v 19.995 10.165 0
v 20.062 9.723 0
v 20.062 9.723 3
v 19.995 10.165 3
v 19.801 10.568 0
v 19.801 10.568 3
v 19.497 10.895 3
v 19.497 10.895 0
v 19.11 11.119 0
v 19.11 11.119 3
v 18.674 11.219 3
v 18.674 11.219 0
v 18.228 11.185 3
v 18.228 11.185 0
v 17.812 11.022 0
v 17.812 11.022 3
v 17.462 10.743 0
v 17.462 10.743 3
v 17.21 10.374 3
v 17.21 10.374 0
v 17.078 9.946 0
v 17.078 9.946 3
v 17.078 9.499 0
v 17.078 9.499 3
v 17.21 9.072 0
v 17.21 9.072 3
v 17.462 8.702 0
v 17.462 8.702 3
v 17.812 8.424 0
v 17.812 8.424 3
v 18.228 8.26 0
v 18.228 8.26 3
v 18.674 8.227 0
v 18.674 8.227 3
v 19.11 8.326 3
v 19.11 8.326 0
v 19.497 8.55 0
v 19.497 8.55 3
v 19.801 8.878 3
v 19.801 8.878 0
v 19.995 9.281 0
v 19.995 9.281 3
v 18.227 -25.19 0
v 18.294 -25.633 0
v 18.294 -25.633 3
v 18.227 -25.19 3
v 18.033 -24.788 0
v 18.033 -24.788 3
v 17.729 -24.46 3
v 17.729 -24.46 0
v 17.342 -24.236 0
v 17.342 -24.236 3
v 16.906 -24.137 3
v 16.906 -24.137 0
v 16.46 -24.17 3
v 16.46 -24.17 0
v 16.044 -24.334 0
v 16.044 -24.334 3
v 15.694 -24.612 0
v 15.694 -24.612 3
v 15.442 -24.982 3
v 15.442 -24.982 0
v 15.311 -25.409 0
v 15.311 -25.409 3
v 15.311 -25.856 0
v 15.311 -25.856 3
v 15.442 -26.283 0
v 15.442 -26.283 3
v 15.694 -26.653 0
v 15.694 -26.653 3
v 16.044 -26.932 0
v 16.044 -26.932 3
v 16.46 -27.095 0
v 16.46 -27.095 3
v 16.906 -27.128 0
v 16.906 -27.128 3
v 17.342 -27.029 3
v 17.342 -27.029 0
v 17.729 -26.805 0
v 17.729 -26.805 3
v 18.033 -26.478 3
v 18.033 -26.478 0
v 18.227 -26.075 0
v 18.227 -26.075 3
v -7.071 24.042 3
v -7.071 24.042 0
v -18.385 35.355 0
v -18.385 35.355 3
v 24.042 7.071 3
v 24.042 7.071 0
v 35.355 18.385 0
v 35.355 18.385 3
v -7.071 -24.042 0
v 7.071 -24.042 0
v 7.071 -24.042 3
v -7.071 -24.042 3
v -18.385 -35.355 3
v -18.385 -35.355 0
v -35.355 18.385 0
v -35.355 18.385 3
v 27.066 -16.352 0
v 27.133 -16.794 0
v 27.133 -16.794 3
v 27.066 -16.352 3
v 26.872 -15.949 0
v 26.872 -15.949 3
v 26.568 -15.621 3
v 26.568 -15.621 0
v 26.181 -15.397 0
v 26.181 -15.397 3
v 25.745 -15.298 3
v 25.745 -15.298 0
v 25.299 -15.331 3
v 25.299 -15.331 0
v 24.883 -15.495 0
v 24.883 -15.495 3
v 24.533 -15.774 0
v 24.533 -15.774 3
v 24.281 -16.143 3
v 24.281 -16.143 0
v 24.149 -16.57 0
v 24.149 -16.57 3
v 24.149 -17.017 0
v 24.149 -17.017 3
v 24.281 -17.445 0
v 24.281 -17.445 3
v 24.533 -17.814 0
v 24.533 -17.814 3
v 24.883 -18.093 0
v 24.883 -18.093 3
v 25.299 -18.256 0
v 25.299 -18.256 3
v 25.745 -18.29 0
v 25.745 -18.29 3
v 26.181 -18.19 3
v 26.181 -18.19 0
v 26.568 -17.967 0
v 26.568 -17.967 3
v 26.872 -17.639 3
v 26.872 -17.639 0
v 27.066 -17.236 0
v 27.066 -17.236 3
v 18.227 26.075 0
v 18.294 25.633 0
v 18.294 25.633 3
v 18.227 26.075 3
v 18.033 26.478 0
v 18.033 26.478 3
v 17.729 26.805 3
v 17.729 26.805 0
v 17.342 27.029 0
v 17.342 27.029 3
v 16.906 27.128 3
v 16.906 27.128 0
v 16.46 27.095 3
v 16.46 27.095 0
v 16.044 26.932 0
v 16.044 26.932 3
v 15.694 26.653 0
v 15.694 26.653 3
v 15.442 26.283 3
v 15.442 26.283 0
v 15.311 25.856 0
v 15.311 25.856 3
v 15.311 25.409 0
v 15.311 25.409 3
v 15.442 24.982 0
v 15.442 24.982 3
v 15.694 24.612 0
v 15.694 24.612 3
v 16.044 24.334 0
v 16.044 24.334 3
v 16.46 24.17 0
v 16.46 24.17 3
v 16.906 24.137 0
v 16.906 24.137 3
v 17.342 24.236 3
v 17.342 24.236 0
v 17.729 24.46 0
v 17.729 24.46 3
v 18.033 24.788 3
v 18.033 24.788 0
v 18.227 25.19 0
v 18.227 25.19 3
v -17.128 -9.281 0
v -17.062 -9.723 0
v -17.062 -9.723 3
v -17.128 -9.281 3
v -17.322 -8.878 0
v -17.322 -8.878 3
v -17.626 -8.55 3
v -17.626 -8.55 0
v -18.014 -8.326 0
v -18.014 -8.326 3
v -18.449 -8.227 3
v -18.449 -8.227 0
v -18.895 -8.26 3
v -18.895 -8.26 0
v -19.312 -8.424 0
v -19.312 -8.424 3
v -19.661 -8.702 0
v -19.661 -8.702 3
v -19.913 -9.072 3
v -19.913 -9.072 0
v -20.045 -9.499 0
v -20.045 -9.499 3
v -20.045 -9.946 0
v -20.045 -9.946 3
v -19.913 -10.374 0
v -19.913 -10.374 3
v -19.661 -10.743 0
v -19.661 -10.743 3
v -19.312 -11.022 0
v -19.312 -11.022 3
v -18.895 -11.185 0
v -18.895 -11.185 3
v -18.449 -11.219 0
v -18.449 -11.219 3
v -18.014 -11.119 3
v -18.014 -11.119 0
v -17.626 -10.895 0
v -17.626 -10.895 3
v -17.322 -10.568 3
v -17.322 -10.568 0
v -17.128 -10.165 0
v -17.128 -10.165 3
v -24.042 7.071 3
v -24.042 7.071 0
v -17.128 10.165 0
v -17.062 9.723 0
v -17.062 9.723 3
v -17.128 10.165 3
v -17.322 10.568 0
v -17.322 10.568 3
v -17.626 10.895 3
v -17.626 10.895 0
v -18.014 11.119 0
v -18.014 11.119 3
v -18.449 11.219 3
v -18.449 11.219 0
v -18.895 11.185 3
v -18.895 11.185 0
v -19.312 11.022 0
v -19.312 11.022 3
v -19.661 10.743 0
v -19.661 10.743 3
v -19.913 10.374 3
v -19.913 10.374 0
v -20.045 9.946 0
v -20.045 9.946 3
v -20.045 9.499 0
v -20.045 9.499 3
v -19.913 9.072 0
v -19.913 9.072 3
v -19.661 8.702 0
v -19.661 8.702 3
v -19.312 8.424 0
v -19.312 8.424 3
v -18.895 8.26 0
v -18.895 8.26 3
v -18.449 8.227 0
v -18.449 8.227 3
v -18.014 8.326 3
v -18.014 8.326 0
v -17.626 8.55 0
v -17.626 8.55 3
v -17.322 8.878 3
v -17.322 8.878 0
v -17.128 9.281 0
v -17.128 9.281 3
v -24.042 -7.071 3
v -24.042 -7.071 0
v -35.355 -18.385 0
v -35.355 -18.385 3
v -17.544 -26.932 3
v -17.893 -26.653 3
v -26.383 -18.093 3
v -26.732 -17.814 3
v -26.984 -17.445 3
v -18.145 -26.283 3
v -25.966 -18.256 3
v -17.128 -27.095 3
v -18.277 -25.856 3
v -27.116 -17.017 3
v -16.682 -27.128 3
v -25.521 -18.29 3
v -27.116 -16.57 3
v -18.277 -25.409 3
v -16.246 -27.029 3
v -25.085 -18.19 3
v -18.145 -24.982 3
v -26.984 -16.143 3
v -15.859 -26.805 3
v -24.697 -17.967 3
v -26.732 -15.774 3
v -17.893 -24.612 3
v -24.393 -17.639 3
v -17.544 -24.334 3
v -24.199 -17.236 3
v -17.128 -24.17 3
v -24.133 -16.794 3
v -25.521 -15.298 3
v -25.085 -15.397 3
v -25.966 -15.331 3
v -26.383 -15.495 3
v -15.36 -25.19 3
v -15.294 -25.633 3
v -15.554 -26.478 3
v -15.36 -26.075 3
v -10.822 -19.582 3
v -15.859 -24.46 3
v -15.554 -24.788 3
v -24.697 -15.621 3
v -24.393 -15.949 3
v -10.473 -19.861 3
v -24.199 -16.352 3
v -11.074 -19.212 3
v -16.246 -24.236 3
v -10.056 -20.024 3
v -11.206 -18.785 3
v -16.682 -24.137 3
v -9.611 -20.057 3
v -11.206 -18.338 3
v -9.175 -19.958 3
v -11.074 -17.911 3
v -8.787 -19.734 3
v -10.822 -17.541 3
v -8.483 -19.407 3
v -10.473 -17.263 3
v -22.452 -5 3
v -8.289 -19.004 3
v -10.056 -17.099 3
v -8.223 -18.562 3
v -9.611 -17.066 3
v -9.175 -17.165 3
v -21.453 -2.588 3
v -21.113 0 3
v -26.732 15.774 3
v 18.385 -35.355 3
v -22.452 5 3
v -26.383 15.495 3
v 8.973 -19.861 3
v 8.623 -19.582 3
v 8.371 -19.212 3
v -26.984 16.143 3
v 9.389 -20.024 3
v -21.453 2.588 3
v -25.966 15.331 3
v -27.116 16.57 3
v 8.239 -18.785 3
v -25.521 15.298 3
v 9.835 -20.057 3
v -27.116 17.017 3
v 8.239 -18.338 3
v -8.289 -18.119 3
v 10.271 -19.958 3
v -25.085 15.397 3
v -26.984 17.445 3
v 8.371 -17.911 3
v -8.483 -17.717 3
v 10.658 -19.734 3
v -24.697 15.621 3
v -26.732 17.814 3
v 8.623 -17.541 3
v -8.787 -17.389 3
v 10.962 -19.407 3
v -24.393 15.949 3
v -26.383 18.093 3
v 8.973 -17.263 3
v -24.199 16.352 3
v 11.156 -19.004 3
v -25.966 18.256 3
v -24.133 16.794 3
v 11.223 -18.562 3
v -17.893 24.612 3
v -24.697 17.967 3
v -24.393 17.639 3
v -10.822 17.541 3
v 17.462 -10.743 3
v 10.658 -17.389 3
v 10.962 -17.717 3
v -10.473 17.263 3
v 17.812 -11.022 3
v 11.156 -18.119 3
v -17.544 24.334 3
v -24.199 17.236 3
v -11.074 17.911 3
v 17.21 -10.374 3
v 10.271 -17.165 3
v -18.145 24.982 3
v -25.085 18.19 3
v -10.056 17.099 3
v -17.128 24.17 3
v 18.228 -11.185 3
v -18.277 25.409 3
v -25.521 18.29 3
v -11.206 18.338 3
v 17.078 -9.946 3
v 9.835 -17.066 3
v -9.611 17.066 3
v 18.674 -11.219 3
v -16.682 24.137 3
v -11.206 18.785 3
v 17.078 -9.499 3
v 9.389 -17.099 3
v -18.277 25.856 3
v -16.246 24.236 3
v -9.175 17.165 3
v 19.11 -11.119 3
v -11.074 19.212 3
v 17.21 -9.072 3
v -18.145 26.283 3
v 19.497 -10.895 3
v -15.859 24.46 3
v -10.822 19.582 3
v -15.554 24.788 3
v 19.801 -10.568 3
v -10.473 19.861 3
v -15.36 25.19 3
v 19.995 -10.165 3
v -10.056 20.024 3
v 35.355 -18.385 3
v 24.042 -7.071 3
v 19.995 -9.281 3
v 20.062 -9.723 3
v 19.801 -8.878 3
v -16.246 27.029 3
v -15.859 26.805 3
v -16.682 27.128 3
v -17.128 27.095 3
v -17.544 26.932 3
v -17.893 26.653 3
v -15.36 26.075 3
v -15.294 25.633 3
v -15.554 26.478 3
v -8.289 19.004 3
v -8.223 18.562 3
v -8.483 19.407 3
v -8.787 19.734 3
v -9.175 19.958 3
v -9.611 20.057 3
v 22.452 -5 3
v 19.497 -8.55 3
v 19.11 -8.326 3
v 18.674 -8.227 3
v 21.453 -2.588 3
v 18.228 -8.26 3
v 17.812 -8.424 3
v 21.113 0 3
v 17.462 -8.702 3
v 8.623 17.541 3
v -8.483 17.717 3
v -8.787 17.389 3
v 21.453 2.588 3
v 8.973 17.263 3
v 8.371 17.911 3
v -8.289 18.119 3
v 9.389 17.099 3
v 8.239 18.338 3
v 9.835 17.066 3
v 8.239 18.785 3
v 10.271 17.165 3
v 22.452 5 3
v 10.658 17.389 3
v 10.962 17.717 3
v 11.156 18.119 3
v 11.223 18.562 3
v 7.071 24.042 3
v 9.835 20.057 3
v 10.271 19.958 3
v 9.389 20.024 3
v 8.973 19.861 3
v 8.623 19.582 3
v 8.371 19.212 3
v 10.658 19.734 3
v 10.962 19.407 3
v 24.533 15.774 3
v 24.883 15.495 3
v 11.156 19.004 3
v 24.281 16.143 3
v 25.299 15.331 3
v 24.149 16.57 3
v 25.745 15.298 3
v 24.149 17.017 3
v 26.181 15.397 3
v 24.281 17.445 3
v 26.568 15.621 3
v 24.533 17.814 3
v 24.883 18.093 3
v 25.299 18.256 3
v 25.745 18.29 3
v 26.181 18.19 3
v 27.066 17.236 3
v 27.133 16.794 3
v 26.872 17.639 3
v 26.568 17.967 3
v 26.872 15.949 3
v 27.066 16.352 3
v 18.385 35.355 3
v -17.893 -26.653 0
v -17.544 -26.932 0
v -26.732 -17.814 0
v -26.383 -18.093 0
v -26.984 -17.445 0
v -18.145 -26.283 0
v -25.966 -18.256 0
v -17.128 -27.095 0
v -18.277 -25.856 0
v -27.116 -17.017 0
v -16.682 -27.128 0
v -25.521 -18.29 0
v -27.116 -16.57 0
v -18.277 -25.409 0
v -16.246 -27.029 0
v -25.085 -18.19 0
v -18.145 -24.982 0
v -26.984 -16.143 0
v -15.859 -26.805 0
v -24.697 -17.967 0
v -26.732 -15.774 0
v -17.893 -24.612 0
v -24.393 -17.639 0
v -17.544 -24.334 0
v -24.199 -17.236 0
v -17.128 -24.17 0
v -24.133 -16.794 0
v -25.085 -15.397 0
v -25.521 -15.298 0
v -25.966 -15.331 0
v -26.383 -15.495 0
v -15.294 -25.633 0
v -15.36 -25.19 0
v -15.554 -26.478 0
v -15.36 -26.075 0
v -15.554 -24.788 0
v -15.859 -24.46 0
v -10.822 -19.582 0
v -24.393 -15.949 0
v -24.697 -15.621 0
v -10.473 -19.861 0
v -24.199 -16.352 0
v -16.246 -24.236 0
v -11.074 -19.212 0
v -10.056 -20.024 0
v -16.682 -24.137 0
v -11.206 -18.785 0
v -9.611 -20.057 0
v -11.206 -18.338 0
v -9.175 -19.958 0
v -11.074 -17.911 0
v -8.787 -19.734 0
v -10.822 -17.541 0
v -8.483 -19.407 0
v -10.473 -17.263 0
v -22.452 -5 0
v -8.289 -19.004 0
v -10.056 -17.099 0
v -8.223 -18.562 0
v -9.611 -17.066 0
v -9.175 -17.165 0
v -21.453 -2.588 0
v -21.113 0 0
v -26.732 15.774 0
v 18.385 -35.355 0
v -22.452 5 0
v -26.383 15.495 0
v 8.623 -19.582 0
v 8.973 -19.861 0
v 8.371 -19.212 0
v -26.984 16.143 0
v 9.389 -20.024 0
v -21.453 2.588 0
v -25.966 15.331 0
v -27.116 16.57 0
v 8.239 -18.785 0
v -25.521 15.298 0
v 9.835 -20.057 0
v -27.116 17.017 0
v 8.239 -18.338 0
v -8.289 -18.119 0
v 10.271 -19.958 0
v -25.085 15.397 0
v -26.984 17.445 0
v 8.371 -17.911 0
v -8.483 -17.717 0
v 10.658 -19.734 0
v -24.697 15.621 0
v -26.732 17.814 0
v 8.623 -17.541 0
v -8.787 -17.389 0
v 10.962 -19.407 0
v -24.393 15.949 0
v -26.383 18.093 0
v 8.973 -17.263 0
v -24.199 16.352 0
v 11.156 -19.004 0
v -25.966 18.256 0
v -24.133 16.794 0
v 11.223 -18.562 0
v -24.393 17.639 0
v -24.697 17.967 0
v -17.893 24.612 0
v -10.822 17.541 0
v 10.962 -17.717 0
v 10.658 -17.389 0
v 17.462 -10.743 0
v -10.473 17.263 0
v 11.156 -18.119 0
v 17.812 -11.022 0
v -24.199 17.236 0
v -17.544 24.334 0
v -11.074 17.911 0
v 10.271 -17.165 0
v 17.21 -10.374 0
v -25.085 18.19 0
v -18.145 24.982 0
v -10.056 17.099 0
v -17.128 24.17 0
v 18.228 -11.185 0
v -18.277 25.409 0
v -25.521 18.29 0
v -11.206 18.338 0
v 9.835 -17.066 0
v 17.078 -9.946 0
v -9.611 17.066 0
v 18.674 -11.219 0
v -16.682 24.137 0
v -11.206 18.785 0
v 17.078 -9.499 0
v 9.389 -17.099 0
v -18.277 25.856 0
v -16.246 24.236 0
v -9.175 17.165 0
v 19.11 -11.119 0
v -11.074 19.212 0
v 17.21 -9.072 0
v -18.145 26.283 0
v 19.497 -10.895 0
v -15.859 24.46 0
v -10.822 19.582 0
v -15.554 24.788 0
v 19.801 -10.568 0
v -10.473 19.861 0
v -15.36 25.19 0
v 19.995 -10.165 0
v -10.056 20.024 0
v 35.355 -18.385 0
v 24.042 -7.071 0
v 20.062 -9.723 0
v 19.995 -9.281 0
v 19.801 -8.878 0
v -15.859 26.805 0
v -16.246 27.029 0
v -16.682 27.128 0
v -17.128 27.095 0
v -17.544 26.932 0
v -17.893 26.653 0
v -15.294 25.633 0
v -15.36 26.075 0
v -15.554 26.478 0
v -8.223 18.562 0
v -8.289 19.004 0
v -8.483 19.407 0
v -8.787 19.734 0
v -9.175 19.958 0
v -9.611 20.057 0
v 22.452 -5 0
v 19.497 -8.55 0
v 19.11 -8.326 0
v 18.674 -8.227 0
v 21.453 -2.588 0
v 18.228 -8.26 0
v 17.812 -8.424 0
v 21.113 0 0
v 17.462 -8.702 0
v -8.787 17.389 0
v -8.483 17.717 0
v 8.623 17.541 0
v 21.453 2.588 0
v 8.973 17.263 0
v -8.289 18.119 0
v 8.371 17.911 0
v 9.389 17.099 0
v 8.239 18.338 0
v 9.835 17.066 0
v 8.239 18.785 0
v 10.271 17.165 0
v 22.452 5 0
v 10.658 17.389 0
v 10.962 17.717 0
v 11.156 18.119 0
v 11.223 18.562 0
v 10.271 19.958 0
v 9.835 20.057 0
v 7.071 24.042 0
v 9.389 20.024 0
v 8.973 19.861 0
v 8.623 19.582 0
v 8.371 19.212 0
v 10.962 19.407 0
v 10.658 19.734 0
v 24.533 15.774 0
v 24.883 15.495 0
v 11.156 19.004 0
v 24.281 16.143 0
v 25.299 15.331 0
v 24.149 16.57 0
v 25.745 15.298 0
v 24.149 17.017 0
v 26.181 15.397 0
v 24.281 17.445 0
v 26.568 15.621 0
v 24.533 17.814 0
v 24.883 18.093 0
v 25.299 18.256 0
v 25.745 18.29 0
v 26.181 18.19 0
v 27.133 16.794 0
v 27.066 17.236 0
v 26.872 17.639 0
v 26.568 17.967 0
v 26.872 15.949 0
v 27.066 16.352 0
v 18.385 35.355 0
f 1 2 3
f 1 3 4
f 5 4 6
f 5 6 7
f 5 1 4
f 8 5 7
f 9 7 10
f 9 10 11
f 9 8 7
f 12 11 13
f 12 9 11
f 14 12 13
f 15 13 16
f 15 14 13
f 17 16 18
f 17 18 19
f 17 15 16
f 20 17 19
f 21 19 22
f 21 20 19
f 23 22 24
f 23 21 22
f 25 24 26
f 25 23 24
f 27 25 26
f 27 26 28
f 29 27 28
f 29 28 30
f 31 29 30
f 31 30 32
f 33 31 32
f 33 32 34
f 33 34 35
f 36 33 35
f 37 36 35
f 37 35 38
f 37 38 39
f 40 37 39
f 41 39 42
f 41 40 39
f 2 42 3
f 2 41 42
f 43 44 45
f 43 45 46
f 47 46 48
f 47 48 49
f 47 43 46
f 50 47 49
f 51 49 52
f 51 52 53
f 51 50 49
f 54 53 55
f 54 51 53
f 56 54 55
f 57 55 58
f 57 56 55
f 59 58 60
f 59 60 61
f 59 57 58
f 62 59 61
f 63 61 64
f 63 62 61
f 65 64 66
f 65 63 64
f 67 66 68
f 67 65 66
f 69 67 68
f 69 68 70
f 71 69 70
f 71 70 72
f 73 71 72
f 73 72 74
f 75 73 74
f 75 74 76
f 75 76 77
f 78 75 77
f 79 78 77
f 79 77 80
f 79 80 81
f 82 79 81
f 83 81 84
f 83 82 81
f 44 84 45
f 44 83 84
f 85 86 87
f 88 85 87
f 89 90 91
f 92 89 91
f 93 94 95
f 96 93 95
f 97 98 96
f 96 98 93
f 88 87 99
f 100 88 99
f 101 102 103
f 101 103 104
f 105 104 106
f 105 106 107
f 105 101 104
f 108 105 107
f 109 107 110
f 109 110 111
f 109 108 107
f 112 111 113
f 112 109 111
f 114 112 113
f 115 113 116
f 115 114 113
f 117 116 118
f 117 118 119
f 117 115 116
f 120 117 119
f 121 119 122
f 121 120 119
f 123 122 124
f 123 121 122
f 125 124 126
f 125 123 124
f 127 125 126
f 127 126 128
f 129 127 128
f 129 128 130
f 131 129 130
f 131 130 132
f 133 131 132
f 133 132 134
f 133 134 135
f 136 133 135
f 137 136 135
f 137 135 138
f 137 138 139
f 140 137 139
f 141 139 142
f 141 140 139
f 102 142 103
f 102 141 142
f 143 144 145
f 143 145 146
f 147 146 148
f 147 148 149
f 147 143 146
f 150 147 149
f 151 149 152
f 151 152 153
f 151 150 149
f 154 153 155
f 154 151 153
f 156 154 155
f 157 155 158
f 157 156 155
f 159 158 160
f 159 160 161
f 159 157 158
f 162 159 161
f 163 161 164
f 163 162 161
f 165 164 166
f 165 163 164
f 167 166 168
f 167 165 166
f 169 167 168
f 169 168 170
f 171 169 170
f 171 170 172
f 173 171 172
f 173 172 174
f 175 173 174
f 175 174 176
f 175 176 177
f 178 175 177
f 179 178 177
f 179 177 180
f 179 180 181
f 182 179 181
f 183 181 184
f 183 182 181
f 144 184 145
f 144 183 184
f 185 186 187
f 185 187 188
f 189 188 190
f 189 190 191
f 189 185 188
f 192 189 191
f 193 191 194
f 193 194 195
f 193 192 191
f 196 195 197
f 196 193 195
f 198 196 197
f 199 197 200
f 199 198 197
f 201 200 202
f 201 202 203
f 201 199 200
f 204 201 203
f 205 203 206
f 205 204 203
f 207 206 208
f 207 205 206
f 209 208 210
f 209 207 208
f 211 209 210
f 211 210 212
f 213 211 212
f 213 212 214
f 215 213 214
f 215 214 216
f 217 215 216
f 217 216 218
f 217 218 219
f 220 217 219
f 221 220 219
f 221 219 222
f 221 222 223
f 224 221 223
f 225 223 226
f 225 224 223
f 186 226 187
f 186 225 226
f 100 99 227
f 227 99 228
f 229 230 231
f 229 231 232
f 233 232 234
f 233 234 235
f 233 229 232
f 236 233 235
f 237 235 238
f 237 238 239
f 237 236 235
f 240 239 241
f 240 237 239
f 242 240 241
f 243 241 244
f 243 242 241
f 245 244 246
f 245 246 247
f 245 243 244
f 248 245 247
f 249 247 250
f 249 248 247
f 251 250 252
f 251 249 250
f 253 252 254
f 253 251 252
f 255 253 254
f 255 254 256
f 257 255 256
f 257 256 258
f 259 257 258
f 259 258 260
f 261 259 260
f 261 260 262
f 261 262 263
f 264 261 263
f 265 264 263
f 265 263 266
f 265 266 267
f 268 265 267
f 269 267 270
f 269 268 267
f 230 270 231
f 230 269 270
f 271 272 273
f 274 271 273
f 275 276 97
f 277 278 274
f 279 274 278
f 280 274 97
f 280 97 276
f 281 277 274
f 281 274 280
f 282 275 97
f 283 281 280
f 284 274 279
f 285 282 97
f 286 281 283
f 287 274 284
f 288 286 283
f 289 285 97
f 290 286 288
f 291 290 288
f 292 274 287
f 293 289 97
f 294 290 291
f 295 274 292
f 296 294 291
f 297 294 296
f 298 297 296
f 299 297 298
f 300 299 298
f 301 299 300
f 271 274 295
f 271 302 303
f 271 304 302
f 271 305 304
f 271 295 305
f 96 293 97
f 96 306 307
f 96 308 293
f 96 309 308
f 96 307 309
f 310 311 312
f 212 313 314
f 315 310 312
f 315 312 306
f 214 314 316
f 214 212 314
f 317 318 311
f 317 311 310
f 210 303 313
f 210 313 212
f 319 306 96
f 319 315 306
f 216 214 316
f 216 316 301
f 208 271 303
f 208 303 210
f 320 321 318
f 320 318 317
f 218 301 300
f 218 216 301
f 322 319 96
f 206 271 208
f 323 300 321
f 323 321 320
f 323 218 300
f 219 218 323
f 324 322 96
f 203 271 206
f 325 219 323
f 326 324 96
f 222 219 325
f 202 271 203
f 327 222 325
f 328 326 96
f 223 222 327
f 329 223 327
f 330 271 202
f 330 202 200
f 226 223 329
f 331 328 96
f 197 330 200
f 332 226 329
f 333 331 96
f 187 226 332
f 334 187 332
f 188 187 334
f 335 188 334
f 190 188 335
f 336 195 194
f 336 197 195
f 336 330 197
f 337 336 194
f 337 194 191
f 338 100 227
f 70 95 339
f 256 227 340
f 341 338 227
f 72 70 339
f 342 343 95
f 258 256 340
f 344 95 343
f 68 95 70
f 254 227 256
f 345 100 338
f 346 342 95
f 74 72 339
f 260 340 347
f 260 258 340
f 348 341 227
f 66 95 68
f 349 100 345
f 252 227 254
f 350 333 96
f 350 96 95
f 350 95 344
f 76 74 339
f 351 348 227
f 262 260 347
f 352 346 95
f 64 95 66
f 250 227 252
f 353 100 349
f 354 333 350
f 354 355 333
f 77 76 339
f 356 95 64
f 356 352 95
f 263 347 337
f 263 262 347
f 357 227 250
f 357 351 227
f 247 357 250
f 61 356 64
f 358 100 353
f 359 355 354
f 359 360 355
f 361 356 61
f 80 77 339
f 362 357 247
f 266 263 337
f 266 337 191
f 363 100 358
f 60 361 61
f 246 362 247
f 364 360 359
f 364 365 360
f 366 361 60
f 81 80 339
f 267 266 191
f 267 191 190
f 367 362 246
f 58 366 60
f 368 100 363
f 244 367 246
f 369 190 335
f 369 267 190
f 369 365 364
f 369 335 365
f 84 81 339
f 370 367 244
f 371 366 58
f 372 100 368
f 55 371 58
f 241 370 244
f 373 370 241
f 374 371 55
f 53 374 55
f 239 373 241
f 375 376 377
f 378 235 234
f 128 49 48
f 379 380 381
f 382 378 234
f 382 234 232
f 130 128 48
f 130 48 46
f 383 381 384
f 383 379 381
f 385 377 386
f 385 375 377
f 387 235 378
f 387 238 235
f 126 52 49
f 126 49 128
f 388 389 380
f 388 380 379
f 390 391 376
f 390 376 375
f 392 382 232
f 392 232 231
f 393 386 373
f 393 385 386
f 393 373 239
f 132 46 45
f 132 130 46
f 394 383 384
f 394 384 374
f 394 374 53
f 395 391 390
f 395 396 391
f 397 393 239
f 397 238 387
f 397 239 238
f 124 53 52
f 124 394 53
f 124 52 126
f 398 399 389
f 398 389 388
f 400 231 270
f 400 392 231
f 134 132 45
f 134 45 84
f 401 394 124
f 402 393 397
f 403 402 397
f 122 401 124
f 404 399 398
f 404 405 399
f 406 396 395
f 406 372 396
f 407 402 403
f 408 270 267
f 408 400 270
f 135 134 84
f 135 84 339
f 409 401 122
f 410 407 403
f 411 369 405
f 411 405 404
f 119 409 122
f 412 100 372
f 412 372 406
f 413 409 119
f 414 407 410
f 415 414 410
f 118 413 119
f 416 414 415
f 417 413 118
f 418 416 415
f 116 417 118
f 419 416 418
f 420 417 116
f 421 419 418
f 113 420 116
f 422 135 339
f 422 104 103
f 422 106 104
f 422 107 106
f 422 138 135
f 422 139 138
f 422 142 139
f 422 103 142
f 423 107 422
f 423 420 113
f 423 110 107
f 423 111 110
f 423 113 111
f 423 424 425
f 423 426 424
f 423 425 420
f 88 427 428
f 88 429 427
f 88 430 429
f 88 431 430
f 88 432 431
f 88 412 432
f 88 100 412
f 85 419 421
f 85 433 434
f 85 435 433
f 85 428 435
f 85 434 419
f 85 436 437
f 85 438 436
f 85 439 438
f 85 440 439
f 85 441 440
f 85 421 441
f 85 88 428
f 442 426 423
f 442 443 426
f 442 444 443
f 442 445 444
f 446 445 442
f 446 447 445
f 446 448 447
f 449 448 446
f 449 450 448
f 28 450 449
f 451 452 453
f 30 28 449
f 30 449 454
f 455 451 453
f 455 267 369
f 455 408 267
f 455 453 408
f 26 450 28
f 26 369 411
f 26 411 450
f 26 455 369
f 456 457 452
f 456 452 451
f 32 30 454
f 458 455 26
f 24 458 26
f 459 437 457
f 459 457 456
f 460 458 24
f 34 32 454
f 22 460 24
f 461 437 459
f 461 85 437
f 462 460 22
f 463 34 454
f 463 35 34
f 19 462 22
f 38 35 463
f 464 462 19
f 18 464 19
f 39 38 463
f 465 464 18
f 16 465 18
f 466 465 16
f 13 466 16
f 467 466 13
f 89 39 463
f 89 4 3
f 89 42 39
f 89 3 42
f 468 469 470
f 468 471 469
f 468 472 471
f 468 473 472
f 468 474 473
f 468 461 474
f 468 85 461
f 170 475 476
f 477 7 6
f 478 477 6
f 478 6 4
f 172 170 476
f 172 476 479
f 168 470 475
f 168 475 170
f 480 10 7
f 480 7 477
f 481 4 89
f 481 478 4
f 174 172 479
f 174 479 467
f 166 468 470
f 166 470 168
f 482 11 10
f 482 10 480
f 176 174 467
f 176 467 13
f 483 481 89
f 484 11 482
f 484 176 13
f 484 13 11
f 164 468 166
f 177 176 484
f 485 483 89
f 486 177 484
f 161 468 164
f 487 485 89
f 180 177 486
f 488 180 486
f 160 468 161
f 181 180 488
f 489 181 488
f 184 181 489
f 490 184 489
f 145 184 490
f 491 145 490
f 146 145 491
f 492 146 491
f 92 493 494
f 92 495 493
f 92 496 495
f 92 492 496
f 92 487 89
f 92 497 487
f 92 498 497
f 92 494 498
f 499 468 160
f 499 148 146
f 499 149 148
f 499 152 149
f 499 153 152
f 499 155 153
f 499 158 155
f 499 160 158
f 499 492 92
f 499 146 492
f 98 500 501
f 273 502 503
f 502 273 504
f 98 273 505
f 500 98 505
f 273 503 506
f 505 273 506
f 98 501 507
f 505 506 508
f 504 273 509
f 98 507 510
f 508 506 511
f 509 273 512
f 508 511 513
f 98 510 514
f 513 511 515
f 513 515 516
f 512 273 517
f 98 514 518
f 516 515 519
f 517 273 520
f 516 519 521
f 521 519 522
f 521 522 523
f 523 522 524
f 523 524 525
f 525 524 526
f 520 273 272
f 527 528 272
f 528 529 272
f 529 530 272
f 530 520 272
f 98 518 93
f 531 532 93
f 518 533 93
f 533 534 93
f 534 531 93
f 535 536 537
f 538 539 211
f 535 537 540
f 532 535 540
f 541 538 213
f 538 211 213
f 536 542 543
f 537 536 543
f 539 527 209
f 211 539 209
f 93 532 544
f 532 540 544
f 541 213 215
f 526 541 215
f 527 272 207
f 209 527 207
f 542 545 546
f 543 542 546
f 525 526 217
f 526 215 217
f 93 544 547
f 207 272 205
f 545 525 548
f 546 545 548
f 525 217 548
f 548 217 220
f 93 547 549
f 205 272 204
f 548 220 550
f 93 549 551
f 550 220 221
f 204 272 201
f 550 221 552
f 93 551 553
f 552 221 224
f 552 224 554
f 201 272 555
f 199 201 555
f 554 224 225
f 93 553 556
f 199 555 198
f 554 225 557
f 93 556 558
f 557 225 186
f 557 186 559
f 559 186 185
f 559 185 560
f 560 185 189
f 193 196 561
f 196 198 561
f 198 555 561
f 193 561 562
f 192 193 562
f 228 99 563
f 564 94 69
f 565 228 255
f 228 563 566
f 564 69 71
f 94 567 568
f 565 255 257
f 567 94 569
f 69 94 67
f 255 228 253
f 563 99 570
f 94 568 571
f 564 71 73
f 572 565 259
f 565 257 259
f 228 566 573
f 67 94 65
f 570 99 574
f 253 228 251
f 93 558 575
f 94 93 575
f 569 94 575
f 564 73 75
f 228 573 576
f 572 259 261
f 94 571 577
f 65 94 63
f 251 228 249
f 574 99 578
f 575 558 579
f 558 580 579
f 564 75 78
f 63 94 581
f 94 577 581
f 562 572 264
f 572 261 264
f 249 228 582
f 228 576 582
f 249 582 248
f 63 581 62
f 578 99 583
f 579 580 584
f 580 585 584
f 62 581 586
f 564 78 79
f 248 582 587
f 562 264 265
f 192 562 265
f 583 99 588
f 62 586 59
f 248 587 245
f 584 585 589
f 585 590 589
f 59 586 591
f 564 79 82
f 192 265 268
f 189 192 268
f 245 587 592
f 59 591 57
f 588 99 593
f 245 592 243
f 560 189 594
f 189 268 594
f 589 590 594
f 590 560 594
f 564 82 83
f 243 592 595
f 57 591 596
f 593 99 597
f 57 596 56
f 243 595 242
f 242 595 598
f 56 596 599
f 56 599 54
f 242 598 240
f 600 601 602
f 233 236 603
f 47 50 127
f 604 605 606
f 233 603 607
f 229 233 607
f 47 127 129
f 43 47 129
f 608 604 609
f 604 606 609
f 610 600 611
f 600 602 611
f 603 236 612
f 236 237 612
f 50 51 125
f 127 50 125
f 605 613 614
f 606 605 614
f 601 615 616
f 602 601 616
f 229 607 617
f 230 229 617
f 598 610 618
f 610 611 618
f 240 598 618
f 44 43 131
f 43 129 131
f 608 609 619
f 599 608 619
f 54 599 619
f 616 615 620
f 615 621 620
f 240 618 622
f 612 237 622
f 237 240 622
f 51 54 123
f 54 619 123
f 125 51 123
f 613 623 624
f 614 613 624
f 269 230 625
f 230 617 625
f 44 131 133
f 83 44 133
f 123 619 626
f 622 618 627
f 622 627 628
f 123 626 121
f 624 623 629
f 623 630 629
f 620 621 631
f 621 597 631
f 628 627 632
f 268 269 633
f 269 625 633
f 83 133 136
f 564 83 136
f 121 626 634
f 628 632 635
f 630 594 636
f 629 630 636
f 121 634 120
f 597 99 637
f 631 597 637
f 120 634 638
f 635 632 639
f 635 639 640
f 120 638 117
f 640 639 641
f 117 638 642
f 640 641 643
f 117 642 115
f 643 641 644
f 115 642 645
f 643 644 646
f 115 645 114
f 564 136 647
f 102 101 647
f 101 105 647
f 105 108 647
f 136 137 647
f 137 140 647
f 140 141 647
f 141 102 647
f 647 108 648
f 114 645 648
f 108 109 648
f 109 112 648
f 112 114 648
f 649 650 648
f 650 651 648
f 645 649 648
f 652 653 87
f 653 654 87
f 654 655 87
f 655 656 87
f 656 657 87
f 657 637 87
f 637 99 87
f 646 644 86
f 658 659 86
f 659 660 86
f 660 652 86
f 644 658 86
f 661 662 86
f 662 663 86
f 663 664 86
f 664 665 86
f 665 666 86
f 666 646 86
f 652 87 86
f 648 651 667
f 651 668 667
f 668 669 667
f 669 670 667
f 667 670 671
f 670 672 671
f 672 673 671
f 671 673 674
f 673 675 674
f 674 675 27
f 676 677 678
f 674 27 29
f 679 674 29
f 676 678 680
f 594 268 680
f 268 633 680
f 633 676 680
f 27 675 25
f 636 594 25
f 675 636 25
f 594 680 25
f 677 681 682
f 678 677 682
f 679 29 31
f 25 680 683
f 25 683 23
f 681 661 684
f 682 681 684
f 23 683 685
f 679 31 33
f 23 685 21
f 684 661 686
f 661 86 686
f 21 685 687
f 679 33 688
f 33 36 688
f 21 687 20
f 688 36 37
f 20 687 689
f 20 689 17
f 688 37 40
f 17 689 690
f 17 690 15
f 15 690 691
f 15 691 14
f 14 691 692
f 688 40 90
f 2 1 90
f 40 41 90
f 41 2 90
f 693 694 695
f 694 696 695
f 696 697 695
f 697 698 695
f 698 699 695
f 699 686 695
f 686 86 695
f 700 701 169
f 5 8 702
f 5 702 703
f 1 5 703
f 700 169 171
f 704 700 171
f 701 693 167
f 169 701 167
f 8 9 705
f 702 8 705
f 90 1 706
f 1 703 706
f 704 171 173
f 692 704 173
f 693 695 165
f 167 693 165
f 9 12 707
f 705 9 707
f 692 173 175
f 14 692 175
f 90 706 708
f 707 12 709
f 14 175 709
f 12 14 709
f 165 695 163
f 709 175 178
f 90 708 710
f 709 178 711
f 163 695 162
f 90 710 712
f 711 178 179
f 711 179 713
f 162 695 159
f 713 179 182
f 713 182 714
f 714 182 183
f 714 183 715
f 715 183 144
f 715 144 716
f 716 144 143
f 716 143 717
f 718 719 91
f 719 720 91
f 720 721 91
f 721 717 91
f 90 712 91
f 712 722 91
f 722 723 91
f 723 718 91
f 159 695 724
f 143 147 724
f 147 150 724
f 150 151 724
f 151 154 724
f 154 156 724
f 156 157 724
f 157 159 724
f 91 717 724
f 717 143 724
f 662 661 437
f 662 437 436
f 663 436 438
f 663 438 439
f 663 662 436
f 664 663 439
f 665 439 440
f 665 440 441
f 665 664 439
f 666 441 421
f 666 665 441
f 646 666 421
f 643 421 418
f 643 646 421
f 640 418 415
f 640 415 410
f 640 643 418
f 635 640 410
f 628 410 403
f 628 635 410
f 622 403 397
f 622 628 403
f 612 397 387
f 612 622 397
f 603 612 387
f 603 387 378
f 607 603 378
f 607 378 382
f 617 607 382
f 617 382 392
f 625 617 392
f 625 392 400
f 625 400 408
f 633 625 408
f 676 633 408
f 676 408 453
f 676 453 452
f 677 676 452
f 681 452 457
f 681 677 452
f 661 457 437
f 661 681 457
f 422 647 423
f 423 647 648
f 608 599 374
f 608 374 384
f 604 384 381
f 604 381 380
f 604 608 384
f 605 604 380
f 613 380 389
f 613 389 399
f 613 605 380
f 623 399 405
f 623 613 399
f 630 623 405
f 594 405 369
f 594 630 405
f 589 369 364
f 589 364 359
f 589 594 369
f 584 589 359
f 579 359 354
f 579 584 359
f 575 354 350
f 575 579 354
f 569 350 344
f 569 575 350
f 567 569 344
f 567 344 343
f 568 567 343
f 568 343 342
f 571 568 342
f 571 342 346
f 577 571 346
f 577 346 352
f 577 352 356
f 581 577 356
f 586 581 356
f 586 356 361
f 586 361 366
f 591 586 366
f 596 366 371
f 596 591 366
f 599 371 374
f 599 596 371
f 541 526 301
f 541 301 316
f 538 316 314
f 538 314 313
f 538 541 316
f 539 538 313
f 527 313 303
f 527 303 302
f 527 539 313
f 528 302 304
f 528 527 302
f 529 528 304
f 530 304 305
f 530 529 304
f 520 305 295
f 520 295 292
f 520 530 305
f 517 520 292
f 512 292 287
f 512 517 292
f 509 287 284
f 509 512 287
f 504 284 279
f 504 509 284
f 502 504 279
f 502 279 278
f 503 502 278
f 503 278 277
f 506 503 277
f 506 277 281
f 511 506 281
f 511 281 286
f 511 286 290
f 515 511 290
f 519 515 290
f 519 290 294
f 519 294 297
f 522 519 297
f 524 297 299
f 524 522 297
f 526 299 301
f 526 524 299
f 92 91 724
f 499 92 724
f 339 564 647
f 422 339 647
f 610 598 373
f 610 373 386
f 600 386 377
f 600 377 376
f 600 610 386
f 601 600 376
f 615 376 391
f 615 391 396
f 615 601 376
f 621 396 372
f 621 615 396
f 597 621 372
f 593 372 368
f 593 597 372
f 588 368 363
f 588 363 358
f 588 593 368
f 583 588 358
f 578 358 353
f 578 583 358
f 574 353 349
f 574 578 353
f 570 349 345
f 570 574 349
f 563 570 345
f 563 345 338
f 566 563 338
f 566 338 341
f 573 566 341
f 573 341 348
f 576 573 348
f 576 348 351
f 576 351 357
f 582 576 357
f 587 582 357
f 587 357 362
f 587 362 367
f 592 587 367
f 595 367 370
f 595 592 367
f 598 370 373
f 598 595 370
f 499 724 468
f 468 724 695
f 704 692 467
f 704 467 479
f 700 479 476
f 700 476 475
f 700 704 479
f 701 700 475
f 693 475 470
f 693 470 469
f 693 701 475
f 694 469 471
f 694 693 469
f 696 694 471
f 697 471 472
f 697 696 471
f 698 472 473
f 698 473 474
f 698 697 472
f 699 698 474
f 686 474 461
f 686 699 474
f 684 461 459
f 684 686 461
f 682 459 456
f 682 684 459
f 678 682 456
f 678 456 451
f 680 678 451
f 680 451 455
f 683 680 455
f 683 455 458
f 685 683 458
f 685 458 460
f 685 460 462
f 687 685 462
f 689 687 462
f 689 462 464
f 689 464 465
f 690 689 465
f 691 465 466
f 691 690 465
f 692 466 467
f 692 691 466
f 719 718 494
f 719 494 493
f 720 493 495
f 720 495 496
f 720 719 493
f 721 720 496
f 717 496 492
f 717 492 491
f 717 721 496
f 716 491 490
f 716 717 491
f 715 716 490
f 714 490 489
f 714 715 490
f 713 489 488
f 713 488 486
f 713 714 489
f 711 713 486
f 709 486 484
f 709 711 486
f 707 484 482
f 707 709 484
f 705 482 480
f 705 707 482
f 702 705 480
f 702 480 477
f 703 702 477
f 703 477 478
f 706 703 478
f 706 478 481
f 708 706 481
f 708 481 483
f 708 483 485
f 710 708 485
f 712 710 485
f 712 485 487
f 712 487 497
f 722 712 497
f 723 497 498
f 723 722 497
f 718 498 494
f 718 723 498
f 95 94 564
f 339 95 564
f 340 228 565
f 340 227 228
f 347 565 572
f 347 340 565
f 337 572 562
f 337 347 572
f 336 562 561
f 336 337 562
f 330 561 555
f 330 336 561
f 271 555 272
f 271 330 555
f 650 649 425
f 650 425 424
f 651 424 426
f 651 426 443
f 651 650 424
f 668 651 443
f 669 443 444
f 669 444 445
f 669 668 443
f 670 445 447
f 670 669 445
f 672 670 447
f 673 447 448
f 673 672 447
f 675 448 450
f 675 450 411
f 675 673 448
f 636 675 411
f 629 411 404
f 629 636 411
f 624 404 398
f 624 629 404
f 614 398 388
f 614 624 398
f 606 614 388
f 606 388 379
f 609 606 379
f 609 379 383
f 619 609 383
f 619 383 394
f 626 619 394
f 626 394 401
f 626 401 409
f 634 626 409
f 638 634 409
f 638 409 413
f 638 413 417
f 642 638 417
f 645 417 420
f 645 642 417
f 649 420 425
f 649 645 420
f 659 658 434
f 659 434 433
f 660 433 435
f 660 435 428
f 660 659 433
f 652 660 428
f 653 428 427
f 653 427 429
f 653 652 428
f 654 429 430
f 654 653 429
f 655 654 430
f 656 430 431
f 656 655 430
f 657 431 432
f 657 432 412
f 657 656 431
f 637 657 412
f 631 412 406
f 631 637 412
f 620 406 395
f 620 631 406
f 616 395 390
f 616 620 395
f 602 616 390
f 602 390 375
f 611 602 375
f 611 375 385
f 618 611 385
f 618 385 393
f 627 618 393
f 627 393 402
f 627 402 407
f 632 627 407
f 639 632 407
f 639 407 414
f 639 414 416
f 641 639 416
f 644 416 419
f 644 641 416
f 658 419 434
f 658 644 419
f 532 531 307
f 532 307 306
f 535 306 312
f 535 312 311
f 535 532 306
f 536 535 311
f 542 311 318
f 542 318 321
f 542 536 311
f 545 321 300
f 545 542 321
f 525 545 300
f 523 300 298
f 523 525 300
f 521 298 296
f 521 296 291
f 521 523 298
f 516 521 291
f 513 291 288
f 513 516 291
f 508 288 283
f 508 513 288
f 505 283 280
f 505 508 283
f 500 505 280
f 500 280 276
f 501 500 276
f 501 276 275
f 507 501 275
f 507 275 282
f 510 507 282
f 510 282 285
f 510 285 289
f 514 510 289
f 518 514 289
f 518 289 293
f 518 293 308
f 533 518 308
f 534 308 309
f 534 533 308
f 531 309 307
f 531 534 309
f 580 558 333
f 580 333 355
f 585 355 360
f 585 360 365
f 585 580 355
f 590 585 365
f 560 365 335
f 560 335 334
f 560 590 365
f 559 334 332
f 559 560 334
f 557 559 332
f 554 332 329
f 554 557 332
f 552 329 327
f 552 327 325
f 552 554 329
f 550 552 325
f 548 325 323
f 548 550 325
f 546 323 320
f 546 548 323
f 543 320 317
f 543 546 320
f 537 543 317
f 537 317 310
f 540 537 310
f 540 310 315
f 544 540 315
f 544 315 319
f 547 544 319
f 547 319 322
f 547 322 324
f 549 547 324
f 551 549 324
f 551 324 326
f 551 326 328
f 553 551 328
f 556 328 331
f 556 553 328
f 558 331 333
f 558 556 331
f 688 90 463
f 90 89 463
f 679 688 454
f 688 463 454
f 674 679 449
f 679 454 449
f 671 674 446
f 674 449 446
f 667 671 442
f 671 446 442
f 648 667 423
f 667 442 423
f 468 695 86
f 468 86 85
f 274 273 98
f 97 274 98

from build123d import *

# Parameters (mm, degrees)
F0_R     = 1.5
F1_DEPTH = 3
F2_R     = 10
F3_SIZE  = 10


with BuildPart() as f1:
    # F0 (on Top) → F1 (new body)
    with BuildSketch(Plane.XY):
        Polygon((-35.355339, 18.384776), (-16.970563, 0), (-35.355339, -18.384776), (-18.384776, -35.355339), (0, -16.970563), (18.384776, -35.355339), (35.355339, -18.384776), (16.970563, 0), (35.355339, 18.384776), (18.384776, 35.355339), (0, 16.970563), (-18.384776, 35.355339), align=None)
        with Locations((-16.793786, -25.632621)):
            Circle(F0_R, mode=Mode.SUBTRACT)
        with Locations((-9.722718, -18.561553)):
            Circle(F0_R, mode=Mode.SUBTRACT)
        with Locations((-25.632621, -16.793786)):
            Circle(F0_R, mode=Mode.SUBTRACT)
        with Locations((-18.561553, -9.722718)):
            Circle(F0_R, mode=Mode.SUBTRACT)
        with Locations((16.793786, -25.632621)):
            Circle(F0_R, mode=Mode.SUBTRACT)
        with Locations((9.722718, -18.561553)):
            Circle(F0_R, mode=Mode.SUBTRACT)
        with Locations((25.632621, -16.793786)):
            Circle(F0_R, mode=Mode.SUBTRACT)
        with Locations((18.561553, -9.722718)):
            Circle(F0_R, mode=Mode.SUBTRACT)
        with Locations((-18.561553, 9.722718)):
            Circle(F0_R, mode=Mode.SUBTRACT)
        with Locations((-25.632621, 16.793786)):
            Circle(F0_R, mode=Mode.SUBTRACT)
        with Locations((-9.722718, 18.561553)):
            Circle(F0_R, mode=Mode.SUBTRACT)
        with Locations((-16.793786, 25.632621)):
            Circle(F0_R, mode=Mode.SUBTRACT)
        with Locations((18.561553, 9.722718)):
            Circle(F0_R, mode=Mode.SUBTRACT)
        with Locations((25.632621, 16.793786)):
            Circle(F0_R, mode=Mode.SUBTRACT)
        with Locations((9.722718, 18.561553)):
            Circle(F0_R, mode=Mode.SUBTRACT)
        with Locations((16.793786, 25.632621)):
            Circle(F0_R, mode=Mode.SUBTRACT)
    extrude(amount=F1_DEPTH)

    # F2
    f2_edges = [f1.edges().sort_by_distance(p)[0] for p in [
        (-16.970563, 0, 1.5),
        (16.970563, 0, 1.5),
    ]]
    fillet(f2_edges, radius=F2_R)

    # F3
    f3_edges = [f1.edges().sort_by_distance(p)[0] for p in [
        (0, -16.970563, 1.5),
        (0, 16.970563, 1.5),
    ]]
    chamfer(f3_edges, length=F3_SIZE)


solid = f1.part
